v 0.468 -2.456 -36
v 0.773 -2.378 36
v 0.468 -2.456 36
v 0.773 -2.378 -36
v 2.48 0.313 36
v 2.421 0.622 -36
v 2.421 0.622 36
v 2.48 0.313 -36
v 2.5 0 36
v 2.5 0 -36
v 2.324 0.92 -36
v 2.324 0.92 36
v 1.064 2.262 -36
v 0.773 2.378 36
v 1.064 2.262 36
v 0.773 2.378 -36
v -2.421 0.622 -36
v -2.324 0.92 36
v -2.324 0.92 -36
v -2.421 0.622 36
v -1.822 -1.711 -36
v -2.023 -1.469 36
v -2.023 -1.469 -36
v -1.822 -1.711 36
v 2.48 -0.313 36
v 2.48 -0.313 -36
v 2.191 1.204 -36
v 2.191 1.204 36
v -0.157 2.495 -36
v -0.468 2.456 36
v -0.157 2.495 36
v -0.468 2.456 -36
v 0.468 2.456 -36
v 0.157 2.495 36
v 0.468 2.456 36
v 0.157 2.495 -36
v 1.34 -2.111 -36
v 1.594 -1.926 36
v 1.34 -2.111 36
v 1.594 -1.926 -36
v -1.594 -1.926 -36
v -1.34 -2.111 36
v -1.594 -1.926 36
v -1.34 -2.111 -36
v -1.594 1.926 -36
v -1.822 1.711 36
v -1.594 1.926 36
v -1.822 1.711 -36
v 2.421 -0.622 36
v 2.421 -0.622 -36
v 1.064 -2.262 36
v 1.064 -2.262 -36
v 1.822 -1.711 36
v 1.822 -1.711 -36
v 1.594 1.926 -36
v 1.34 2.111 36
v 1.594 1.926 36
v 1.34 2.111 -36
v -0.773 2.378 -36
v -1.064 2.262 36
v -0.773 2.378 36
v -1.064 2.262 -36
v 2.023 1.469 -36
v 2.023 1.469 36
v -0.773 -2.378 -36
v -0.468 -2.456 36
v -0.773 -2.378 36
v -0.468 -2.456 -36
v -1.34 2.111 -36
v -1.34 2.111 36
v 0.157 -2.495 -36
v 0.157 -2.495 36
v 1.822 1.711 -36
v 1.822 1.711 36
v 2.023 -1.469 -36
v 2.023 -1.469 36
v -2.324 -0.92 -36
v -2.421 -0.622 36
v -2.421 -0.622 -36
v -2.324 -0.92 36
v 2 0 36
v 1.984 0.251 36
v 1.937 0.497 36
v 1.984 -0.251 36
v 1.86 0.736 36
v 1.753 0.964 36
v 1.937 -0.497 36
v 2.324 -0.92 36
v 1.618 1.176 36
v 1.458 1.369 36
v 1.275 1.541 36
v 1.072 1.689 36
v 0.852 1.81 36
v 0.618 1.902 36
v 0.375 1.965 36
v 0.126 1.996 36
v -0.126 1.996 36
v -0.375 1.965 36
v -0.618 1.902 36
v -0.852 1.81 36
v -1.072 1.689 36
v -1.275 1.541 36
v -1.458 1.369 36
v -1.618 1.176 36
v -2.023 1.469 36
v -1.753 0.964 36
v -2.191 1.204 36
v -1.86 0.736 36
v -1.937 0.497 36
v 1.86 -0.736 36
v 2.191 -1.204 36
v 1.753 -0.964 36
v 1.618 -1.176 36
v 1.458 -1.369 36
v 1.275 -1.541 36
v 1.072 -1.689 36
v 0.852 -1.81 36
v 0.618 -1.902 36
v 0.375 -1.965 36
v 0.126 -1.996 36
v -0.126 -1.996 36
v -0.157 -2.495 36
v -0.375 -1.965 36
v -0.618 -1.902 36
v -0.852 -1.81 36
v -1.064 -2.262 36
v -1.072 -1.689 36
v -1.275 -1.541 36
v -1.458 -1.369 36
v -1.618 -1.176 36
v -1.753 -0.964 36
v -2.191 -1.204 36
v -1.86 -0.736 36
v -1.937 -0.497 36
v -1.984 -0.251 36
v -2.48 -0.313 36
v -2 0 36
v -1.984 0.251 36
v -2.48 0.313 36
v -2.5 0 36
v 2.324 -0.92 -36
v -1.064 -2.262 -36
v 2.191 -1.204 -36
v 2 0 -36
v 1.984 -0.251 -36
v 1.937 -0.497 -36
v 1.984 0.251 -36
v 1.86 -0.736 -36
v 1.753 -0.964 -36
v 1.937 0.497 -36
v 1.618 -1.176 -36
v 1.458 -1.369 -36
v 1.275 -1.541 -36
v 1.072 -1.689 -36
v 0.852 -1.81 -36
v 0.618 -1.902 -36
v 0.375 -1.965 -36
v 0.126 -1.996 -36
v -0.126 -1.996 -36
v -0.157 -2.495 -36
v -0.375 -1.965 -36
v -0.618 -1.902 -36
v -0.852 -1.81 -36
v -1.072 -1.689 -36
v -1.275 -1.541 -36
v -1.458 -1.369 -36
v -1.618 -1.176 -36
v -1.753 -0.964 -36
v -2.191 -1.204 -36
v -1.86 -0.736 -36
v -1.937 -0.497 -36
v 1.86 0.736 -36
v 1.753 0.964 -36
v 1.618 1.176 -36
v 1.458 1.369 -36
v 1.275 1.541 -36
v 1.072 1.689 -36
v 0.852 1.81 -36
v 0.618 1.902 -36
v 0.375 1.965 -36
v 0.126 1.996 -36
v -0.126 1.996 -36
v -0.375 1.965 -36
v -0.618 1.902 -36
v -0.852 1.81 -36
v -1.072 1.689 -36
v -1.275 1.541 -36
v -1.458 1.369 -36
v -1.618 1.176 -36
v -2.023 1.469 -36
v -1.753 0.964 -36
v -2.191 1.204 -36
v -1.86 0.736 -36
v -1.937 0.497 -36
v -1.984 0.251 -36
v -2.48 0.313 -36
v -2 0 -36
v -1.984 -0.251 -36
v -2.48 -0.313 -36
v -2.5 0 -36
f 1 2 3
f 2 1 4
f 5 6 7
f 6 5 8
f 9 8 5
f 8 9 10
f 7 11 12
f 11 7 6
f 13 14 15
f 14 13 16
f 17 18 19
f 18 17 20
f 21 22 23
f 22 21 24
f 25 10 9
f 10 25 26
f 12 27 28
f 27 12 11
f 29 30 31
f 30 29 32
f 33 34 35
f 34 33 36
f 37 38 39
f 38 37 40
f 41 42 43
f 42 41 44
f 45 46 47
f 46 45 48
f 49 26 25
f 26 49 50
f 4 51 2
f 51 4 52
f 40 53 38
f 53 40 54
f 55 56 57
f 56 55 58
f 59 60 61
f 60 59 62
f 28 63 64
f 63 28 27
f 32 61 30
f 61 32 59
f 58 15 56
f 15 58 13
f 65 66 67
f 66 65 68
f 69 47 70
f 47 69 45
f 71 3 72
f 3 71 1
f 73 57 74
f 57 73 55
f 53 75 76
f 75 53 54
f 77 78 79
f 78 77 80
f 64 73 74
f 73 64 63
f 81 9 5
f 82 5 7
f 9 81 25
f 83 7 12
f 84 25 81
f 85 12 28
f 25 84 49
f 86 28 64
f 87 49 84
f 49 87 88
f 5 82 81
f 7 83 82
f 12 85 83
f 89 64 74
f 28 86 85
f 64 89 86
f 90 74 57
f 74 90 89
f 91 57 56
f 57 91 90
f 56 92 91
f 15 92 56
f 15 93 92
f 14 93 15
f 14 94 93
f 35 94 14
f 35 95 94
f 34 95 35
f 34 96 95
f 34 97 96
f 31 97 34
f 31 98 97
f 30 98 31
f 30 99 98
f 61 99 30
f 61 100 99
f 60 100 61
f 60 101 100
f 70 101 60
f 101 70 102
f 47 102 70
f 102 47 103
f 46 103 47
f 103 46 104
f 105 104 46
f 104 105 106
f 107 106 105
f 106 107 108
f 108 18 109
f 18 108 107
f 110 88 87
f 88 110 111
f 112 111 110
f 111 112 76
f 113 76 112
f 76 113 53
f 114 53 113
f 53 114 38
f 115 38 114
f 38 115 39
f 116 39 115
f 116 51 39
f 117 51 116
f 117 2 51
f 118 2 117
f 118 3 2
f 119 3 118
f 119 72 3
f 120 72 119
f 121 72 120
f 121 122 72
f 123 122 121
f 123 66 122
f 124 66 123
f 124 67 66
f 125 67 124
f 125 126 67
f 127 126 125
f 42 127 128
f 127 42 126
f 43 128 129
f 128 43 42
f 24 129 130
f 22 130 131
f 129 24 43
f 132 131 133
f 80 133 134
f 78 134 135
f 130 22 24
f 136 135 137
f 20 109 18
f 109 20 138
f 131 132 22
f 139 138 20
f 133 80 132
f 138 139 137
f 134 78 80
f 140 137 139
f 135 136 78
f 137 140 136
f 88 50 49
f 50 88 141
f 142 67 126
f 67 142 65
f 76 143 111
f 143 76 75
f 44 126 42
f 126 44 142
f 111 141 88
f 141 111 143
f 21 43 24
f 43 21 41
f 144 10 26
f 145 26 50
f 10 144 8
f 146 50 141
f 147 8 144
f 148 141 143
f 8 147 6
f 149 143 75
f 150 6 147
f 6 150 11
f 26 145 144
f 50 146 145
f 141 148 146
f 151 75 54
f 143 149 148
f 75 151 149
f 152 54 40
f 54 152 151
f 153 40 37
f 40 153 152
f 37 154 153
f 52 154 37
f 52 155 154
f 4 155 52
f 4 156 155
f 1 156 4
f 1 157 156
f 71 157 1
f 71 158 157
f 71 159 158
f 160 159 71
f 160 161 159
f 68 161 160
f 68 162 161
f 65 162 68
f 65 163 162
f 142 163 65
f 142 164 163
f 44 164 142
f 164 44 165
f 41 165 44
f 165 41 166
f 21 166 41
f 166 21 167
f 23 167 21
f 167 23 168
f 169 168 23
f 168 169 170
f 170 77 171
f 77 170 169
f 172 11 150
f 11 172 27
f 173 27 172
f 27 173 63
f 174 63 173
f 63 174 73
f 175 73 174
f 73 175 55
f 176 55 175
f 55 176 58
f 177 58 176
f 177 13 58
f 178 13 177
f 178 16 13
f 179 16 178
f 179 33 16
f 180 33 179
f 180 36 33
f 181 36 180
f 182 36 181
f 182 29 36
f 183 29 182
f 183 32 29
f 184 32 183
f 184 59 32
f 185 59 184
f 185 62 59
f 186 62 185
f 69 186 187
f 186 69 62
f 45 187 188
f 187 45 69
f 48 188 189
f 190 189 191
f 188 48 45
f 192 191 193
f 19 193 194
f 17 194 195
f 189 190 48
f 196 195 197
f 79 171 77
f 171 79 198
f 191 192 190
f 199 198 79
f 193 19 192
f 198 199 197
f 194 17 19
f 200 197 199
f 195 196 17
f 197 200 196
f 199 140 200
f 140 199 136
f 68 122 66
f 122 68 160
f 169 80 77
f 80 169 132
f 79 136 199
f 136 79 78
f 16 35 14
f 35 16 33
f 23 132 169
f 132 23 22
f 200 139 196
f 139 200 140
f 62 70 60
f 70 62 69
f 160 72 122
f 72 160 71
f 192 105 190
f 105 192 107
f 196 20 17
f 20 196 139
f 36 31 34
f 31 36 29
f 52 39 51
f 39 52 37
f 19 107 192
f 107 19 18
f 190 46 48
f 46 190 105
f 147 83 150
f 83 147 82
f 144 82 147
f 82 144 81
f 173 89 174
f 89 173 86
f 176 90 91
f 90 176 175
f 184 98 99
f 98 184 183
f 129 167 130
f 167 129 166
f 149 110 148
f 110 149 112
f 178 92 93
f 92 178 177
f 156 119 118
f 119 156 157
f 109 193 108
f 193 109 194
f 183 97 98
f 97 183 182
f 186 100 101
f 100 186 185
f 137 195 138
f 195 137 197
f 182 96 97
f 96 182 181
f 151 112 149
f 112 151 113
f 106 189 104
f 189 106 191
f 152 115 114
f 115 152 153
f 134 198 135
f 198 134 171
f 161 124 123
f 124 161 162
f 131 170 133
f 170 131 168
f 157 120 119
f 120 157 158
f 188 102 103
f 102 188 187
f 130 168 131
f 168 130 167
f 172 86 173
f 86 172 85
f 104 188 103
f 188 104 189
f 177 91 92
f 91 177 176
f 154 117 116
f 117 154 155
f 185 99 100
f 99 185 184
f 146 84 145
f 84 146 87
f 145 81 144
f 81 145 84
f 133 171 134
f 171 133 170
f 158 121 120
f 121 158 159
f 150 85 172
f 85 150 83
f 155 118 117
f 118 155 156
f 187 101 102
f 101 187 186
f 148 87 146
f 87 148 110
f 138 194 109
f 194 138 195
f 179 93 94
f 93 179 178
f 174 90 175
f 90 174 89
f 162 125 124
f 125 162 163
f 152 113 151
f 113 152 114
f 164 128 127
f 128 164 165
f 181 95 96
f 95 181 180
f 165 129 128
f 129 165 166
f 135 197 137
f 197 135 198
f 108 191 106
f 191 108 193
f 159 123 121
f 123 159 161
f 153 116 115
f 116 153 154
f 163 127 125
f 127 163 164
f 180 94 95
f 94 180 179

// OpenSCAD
$fn = 50;


difference() {
	union() {
		translate(v = [0, 0, -36.0000000000]) {
			cylinder(h = 72, r = 2.5000000000);
		}
	}
	union() {
		translate(v = [0, 0, -100.0000000000]) {
			cylinder(h = 200, r = 2.0000000000);
		}
	}
}
